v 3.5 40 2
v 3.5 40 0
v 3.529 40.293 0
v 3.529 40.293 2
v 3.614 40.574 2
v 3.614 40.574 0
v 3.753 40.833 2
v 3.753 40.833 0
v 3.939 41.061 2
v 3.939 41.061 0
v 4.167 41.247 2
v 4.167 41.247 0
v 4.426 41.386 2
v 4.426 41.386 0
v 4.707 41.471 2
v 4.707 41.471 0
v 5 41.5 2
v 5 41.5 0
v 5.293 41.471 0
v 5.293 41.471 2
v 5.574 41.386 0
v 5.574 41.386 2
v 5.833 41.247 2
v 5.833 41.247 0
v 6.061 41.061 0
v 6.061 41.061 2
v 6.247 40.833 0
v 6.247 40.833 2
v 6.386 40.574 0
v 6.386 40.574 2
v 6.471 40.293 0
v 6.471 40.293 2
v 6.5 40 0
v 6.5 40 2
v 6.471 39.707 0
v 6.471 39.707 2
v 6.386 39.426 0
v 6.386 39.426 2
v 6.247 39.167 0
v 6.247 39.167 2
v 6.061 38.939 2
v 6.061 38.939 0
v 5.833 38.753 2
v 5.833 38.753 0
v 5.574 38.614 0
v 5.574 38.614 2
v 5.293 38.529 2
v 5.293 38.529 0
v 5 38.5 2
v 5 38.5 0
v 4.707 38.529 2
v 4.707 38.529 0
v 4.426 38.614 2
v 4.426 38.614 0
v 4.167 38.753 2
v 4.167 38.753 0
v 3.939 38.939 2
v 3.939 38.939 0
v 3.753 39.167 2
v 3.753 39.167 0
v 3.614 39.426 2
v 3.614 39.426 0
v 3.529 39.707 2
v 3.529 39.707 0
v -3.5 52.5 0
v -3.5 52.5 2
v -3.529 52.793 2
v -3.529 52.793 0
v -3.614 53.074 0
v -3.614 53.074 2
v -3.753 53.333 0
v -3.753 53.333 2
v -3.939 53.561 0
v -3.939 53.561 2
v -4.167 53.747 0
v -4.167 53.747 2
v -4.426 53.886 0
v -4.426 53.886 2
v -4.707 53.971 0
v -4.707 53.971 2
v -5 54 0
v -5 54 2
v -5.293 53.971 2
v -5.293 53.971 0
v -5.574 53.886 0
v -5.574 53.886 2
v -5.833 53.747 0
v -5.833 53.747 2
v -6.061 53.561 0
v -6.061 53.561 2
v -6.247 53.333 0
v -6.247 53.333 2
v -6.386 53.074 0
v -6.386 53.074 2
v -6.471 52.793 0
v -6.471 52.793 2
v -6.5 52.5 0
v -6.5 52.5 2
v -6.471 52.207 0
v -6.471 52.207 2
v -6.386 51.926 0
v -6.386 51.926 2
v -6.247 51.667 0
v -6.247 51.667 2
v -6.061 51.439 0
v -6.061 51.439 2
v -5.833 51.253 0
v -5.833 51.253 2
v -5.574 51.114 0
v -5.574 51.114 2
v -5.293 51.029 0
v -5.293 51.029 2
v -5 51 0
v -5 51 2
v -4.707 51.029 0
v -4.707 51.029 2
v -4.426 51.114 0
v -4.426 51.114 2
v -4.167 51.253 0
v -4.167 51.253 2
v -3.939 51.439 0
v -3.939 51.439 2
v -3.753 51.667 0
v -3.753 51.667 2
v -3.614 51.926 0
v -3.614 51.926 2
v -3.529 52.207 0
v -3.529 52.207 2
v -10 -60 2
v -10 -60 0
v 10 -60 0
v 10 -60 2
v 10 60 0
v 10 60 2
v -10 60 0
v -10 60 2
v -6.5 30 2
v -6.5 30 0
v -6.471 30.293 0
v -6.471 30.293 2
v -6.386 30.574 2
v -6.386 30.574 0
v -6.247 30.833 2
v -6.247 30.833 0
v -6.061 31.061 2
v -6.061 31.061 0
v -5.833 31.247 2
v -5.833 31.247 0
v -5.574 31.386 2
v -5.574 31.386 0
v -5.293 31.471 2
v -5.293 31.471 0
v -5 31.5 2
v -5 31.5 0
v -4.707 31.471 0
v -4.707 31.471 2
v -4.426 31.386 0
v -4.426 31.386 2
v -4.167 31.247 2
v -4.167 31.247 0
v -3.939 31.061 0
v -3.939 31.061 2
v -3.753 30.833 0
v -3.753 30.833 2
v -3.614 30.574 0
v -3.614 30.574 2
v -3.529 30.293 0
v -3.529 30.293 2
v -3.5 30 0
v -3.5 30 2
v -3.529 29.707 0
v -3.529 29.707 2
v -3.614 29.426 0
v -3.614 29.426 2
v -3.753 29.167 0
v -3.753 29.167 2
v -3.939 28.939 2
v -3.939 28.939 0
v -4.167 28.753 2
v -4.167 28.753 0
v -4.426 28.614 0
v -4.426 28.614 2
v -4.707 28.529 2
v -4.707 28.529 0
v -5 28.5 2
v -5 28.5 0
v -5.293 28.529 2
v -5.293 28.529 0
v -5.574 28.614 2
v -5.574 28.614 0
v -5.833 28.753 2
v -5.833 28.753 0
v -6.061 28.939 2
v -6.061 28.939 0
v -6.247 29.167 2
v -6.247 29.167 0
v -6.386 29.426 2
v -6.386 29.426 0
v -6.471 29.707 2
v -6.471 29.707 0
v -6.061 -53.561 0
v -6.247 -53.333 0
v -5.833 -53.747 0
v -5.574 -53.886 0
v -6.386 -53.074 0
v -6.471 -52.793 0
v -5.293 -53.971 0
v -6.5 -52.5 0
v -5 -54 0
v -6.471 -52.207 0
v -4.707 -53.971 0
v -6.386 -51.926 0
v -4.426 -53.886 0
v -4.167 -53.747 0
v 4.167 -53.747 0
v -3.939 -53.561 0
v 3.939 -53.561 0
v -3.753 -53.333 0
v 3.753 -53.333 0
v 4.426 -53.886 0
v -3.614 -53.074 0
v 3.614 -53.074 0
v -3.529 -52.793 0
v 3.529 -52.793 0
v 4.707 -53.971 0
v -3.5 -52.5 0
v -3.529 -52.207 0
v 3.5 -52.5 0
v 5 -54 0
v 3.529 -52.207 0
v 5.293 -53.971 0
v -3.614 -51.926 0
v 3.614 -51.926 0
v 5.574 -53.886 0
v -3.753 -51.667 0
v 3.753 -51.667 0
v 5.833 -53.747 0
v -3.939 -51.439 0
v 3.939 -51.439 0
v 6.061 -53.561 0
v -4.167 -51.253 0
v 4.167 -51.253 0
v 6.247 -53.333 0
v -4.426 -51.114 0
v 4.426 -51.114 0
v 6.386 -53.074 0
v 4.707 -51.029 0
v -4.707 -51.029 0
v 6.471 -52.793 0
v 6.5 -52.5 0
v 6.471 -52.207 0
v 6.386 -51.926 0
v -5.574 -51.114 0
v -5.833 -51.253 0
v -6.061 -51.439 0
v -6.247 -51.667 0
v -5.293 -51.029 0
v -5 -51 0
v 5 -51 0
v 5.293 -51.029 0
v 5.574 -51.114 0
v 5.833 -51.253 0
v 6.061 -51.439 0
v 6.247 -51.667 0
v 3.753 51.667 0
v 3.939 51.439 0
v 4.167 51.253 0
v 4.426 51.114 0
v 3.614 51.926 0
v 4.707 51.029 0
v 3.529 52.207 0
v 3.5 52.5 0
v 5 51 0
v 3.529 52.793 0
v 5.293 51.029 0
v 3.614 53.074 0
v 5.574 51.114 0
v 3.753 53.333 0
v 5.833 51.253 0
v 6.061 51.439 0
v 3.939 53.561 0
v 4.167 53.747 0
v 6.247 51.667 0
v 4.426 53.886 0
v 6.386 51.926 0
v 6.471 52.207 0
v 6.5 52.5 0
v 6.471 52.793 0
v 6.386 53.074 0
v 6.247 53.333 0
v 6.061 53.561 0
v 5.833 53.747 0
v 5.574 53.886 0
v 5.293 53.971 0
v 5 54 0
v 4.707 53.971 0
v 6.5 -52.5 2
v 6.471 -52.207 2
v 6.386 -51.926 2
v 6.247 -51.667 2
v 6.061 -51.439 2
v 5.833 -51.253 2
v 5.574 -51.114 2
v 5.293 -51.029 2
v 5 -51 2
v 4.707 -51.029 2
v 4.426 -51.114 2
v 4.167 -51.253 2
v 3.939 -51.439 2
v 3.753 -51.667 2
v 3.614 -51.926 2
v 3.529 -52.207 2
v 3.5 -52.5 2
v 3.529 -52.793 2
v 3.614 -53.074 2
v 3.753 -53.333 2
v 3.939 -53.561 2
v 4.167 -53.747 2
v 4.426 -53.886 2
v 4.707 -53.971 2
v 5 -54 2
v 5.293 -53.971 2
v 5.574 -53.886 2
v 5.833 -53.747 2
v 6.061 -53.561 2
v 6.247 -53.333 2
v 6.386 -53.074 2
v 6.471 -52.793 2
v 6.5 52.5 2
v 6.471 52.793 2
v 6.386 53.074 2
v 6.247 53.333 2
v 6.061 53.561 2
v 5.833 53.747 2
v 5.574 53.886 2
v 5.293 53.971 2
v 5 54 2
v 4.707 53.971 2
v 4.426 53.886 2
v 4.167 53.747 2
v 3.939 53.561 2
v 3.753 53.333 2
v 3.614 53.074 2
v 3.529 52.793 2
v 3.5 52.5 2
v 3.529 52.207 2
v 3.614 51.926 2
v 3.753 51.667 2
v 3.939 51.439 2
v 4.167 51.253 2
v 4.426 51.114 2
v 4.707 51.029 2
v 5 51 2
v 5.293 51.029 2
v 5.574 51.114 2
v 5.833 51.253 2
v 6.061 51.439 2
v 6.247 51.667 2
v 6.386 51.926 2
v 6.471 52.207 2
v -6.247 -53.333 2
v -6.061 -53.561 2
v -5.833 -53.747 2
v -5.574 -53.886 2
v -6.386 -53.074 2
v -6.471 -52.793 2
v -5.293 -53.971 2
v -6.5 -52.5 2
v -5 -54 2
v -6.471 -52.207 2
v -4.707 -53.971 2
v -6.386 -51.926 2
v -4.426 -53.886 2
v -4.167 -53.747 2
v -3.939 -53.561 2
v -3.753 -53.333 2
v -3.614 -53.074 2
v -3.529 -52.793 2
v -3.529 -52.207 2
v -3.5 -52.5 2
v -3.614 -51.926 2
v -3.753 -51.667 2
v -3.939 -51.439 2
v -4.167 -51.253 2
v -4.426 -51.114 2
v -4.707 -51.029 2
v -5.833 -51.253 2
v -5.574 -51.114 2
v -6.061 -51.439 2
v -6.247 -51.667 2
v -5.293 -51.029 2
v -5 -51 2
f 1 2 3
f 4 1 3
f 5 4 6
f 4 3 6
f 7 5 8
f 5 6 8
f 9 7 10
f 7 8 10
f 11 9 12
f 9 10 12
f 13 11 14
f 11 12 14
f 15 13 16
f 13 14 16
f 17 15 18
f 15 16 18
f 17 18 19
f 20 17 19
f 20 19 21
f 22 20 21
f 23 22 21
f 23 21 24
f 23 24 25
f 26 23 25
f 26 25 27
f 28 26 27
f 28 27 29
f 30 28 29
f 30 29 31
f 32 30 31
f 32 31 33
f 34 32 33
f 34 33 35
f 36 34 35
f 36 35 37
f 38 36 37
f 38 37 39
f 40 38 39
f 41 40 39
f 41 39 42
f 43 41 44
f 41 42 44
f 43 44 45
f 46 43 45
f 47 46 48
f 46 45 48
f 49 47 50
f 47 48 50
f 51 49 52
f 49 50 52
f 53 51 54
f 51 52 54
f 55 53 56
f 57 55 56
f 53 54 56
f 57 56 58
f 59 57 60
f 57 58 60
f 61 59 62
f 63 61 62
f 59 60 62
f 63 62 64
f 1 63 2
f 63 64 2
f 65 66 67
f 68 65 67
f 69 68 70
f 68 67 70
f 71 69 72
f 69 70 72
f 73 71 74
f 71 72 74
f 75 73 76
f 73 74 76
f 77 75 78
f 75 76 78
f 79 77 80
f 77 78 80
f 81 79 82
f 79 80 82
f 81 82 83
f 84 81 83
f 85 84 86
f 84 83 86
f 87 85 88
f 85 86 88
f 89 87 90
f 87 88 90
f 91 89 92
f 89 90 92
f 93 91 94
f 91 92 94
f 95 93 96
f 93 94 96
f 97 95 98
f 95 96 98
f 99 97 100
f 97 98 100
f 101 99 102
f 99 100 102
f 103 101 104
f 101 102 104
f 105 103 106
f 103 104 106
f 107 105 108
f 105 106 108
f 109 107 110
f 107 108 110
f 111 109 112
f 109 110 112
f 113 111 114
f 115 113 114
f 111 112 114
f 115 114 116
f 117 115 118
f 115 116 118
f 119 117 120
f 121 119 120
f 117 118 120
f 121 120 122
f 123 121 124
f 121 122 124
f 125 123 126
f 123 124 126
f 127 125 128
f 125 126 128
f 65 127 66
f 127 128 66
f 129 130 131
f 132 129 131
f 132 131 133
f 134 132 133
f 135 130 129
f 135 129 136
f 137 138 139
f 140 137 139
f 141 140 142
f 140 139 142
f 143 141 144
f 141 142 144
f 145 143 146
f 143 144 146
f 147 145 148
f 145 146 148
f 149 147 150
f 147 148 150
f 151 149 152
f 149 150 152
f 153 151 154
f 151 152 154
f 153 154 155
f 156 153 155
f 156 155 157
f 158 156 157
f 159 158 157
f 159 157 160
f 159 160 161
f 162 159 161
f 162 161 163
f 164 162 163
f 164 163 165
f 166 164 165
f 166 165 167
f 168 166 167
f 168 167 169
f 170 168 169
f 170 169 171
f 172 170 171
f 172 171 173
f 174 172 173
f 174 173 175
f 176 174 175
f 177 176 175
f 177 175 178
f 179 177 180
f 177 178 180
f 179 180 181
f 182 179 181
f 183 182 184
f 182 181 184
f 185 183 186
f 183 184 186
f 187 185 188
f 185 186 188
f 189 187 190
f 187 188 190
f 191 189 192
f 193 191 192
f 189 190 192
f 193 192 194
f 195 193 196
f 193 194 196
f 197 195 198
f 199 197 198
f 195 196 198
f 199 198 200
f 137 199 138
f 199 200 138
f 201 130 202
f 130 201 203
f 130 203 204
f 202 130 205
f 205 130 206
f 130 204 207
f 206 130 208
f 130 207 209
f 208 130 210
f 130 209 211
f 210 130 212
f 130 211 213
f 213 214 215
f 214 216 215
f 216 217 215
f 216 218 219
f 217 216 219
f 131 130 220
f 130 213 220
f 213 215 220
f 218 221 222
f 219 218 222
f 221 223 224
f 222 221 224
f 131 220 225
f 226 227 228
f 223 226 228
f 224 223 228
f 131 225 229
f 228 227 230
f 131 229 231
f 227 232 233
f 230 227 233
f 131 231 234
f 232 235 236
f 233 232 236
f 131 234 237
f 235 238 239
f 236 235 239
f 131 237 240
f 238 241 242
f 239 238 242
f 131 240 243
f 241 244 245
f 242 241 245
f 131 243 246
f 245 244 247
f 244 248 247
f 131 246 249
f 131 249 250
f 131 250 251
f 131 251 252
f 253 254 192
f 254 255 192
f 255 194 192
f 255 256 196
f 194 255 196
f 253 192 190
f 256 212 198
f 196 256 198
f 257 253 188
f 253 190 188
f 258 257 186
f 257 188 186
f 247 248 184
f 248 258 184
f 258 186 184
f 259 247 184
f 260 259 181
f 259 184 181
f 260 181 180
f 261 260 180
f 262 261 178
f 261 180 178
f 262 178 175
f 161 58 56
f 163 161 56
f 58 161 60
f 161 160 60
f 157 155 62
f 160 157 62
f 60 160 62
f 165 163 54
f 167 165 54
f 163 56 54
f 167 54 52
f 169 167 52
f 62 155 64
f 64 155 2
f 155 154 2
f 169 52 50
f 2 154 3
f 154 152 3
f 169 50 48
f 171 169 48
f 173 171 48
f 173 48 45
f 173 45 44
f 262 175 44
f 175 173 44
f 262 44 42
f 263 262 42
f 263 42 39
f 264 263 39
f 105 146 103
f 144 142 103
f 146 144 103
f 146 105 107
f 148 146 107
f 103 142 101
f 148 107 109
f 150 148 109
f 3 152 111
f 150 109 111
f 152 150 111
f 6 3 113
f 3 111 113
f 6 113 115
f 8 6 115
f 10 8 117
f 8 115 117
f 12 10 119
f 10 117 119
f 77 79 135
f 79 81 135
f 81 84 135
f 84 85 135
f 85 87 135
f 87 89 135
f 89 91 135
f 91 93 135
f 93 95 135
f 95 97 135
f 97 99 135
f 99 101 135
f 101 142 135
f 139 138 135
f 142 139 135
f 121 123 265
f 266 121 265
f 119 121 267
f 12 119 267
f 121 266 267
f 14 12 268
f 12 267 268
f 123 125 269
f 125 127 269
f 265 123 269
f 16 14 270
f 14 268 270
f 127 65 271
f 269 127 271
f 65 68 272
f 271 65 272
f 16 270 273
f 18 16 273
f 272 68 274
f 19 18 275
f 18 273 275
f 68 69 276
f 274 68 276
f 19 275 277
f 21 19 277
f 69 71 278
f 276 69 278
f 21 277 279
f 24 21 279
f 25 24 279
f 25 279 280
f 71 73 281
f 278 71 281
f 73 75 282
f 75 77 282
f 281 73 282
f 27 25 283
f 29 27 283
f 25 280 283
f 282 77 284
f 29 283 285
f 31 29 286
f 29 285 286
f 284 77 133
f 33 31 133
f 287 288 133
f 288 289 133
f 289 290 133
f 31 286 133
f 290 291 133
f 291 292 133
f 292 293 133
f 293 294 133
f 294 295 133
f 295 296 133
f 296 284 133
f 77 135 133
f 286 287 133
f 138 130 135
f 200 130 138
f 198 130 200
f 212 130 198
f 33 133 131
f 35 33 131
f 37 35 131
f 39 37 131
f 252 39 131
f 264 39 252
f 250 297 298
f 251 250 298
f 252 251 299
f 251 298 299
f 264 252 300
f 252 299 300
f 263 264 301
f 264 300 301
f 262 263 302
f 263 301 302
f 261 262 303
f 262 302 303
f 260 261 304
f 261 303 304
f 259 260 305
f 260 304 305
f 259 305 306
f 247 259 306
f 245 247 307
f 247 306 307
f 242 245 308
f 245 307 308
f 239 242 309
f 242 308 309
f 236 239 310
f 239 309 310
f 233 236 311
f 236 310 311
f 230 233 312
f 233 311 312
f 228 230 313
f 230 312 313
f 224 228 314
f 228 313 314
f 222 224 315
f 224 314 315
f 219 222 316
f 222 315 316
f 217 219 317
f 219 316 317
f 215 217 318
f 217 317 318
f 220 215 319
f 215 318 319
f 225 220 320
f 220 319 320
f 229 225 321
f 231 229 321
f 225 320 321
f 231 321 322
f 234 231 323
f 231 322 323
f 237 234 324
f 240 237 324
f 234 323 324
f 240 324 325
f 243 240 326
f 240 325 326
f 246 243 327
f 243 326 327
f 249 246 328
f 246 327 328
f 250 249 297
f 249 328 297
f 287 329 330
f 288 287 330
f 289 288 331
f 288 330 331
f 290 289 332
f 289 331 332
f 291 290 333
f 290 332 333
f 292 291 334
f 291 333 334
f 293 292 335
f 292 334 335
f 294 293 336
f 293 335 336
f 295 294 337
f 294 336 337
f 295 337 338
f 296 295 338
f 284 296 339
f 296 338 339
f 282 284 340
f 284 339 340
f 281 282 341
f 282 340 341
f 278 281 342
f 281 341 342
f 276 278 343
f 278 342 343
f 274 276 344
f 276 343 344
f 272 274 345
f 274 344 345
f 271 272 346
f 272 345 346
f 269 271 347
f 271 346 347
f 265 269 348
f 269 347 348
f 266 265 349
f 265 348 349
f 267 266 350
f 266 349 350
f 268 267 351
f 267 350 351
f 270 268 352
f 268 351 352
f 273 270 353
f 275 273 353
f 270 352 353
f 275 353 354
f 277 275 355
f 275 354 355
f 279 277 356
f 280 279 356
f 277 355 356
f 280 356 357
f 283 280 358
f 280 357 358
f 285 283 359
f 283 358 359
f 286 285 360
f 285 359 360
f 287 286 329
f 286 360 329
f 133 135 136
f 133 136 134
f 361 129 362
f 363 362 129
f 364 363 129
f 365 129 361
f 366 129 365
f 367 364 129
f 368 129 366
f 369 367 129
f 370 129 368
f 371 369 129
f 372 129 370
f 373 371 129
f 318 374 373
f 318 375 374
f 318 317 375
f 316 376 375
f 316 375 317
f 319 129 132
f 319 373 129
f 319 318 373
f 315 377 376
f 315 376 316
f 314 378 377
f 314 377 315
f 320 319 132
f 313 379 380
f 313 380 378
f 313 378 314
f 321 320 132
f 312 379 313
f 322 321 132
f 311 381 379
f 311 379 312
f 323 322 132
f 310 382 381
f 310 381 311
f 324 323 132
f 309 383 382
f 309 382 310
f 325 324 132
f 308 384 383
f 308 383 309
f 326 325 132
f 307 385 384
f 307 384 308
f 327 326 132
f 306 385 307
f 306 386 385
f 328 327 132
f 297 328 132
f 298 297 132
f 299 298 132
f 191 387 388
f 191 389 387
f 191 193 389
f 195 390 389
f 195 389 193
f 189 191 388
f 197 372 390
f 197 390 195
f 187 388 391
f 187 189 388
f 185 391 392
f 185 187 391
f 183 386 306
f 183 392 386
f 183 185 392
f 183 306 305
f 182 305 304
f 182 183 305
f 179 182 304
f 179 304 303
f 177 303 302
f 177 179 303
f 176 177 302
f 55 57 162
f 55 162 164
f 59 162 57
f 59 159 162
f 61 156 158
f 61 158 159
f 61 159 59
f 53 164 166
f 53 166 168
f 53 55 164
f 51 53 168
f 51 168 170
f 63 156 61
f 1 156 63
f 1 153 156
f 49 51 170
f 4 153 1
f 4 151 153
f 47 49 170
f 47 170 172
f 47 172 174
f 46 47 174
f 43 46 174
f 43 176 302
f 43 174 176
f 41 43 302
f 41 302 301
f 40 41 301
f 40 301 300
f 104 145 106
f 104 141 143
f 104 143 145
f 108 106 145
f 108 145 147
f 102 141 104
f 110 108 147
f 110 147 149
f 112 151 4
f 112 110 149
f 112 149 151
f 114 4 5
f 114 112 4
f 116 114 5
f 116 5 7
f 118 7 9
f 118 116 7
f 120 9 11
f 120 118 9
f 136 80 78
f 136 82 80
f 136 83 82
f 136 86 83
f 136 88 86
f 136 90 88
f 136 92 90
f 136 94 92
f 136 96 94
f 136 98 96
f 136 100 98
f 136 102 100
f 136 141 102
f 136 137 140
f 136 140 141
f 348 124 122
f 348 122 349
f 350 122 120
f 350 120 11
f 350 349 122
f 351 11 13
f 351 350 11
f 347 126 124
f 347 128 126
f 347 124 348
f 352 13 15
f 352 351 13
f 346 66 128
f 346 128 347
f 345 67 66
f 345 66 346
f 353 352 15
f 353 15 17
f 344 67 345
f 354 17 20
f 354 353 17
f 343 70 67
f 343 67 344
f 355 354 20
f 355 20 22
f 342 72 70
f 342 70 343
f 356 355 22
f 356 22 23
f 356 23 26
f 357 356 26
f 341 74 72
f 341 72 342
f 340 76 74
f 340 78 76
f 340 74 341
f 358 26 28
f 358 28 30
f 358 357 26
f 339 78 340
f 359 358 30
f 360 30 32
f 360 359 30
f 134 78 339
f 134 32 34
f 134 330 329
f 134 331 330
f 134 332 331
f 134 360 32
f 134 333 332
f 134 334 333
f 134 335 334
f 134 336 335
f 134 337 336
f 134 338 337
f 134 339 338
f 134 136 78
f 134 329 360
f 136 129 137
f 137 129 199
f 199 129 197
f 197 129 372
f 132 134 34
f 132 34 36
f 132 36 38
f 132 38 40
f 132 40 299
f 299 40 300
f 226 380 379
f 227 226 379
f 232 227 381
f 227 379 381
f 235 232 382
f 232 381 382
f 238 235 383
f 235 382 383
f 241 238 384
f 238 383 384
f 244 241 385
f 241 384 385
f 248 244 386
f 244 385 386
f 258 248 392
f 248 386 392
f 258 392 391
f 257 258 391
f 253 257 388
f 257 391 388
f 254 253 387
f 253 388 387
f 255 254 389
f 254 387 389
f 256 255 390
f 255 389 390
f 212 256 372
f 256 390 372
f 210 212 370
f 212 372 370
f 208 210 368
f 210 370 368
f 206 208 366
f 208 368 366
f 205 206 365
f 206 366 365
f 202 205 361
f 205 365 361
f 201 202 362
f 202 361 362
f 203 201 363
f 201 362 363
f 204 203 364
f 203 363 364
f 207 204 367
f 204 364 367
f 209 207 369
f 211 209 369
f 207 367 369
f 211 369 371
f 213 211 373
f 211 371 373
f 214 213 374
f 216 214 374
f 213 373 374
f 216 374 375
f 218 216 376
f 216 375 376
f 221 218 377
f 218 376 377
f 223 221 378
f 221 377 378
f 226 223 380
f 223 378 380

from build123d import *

# Parameters (mm, degrees)
ESQUISSE1_W                = 20
ESQUISSE1_H                = 120
EXTRUSION1_DEPTH           = 2
ESQUISSE2_R                = 1.5
EXTRUSION2_DEPTH           = 2
ESQUISSE3_R                = 1.5
EXTRUSION3_DEPTH           = 2
R_P_TITION_LIN_AIRE1_COUNT = 2
R_P_TITION_LIN_AIRE1_PITCH = 105
ESQUISSE4_R                = 1.5
ENL_V_MAT_EXTRU_1_DEPTH    = 61.860496219


with BuildPart() as part:
    # Esquisse1 → Extrusion1 (new body)
    with BuildSketch(Plane.XY):
        Rectangle(ESQUISSE1_W, ESQUISSE1_H)
    extrude(amount=EXTRUSION1_DEPTH)

    # Esquisse2 → Extrusion2 (cut)
    with BuildSketch(Plane.XY.offset(2)):
        with Locations((-5, 52.5)):
            Circle(ESQUISSE2_R)
    extrusion2 = extrude(amount=-EXTRUSION2_DEPTH, mode=Mode.SUBTRACT)

    # Esquisse3 → Extrusion3 (cut)
    with BuildSketch(Plane.XY.offset(2)):
        with Locations((5, 52.5)):
            Circle(ESQUISSE3_R)
    extrusion3 = extrude(amount=-EXTRUSION3_DEPTH, mode=Mode.SUBTRACT)

    # Répétition linéaire1: Extrusion2, Extrusion3 ×2
    with Locations(*[(0, -i * R_P_TITION_LIN_AIRE1_PITCH, 0) for i in range(1, R_P_TITION_LIN_AIRE1_COUNT)]):
        add(extrusion2, mode=Mode.SUBTRACT)
        add(extrusion3, mode=Mode.SUBTRACT)

    # Esquisse4 → Enlèv. mat.-Extru.1 (cut, through all)
    with BuildSketch(Plane(origin=(0, 0, 0), x_dir=(-1, 0, 0), z_dir=(0, 0, -1))):
        with Locations((-5, 40)):
            Circle(ESQUISSE4_R)
        with Locations((5, 30)):
            Circle(ESQUISSE4_R)
    extrude(amount=-ENL_V_MAT_EXTRU_1_DEPTH, mode=Mode.SUBTRACT)


solid = part.part
